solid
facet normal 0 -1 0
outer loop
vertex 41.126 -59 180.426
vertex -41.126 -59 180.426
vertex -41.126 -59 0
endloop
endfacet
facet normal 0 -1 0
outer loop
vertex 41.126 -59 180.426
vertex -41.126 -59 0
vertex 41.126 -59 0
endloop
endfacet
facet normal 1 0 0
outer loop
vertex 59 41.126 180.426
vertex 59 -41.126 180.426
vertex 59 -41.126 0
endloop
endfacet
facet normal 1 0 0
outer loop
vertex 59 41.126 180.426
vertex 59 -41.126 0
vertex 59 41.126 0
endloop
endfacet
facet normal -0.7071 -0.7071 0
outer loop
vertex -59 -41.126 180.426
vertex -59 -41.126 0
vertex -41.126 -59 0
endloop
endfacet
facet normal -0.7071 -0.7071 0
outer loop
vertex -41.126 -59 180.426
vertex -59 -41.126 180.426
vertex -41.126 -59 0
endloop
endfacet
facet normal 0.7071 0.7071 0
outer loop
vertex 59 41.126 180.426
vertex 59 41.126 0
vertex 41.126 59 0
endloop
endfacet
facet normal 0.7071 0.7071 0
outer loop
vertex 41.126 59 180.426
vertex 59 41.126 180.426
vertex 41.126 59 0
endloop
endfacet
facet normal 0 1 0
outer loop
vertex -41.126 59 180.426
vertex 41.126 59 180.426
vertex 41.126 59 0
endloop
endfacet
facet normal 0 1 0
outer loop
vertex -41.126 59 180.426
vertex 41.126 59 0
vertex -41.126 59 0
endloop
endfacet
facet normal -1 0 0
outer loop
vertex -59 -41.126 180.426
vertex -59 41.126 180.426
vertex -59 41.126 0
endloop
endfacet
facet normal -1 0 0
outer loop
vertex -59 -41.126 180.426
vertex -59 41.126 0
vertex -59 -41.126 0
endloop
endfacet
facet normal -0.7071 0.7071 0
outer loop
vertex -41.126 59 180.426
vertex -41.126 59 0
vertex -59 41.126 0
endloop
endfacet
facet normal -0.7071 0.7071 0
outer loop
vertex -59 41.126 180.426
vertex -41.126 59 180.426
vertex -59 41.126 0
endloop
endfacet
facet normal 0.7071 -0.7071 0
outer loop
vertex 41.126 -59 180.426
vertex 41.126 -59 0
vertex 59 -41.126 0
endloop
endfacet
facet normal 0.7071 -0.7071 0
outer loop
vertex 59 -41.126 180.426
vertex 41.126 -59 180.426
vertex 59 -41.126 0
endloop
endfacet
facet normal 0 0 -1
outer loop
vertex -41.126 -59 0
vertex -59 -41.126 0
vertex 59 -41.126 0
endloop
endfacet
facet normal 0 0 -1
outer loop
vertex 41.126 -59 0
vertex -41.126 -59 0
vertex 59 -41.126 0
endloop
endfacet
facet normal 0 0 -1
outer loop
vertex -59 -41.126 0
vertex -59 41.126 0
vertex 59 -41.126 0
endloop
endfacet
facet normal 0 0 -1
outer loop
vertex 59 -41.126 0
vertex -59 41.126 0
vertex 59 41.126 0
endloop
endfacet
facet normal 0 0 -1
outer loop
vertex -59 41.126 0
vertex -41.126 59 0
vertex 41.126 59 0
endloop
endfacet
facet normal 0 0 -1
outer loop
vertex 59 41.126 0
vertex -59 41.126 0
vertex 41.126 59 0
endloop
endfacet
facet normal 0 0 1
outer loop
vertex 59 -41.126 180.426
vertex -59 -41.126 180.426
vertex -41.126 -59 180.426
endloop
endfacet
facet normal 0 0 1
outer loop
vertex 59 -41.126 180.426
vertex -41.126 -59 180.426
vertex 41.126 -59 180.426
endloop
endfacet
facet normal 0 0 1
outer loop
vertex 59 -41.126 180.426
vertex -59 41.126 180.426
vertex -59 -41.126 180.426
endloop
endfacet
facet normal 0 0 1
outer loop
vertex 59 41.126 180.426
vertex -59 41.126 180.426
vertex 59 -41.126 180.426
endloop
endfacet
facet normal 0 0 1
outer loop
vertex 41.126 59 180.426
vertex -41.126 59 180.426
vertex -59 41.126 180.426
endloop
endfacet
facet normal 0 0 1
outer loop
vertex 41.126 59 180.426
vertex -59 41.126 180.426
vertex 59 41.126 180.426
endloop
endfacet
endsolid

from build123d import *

# Parameters (mm, degrees)
EXTRUDE_2_DEPTH = 237
SCALE_1_SCALE   = 0.761290323


with BuildPart() as part:
    # 草图3 → 凸台-拉伸2 (new body)
    with BuildSketch(Plane.XY):
        Polygon((-77.5, -54.021861301), (-54.021861301, -77.5), (54.021861301, -77.5), (77.5, -54.021861301), (77.5, 54.021861301), (54.021861301, 77.5), (-54.021861301, 77.5), (-77.5, 54.021861301), align=None)
    extrude(amount=EXTRUDE_2_DEPTH)


with BuildPart() as part_1:
    # 缩放比例1: scaled about (0, 0, 0)
    add(part.part.scale(SCALE_1_SCALE))


solid = part_1.part
